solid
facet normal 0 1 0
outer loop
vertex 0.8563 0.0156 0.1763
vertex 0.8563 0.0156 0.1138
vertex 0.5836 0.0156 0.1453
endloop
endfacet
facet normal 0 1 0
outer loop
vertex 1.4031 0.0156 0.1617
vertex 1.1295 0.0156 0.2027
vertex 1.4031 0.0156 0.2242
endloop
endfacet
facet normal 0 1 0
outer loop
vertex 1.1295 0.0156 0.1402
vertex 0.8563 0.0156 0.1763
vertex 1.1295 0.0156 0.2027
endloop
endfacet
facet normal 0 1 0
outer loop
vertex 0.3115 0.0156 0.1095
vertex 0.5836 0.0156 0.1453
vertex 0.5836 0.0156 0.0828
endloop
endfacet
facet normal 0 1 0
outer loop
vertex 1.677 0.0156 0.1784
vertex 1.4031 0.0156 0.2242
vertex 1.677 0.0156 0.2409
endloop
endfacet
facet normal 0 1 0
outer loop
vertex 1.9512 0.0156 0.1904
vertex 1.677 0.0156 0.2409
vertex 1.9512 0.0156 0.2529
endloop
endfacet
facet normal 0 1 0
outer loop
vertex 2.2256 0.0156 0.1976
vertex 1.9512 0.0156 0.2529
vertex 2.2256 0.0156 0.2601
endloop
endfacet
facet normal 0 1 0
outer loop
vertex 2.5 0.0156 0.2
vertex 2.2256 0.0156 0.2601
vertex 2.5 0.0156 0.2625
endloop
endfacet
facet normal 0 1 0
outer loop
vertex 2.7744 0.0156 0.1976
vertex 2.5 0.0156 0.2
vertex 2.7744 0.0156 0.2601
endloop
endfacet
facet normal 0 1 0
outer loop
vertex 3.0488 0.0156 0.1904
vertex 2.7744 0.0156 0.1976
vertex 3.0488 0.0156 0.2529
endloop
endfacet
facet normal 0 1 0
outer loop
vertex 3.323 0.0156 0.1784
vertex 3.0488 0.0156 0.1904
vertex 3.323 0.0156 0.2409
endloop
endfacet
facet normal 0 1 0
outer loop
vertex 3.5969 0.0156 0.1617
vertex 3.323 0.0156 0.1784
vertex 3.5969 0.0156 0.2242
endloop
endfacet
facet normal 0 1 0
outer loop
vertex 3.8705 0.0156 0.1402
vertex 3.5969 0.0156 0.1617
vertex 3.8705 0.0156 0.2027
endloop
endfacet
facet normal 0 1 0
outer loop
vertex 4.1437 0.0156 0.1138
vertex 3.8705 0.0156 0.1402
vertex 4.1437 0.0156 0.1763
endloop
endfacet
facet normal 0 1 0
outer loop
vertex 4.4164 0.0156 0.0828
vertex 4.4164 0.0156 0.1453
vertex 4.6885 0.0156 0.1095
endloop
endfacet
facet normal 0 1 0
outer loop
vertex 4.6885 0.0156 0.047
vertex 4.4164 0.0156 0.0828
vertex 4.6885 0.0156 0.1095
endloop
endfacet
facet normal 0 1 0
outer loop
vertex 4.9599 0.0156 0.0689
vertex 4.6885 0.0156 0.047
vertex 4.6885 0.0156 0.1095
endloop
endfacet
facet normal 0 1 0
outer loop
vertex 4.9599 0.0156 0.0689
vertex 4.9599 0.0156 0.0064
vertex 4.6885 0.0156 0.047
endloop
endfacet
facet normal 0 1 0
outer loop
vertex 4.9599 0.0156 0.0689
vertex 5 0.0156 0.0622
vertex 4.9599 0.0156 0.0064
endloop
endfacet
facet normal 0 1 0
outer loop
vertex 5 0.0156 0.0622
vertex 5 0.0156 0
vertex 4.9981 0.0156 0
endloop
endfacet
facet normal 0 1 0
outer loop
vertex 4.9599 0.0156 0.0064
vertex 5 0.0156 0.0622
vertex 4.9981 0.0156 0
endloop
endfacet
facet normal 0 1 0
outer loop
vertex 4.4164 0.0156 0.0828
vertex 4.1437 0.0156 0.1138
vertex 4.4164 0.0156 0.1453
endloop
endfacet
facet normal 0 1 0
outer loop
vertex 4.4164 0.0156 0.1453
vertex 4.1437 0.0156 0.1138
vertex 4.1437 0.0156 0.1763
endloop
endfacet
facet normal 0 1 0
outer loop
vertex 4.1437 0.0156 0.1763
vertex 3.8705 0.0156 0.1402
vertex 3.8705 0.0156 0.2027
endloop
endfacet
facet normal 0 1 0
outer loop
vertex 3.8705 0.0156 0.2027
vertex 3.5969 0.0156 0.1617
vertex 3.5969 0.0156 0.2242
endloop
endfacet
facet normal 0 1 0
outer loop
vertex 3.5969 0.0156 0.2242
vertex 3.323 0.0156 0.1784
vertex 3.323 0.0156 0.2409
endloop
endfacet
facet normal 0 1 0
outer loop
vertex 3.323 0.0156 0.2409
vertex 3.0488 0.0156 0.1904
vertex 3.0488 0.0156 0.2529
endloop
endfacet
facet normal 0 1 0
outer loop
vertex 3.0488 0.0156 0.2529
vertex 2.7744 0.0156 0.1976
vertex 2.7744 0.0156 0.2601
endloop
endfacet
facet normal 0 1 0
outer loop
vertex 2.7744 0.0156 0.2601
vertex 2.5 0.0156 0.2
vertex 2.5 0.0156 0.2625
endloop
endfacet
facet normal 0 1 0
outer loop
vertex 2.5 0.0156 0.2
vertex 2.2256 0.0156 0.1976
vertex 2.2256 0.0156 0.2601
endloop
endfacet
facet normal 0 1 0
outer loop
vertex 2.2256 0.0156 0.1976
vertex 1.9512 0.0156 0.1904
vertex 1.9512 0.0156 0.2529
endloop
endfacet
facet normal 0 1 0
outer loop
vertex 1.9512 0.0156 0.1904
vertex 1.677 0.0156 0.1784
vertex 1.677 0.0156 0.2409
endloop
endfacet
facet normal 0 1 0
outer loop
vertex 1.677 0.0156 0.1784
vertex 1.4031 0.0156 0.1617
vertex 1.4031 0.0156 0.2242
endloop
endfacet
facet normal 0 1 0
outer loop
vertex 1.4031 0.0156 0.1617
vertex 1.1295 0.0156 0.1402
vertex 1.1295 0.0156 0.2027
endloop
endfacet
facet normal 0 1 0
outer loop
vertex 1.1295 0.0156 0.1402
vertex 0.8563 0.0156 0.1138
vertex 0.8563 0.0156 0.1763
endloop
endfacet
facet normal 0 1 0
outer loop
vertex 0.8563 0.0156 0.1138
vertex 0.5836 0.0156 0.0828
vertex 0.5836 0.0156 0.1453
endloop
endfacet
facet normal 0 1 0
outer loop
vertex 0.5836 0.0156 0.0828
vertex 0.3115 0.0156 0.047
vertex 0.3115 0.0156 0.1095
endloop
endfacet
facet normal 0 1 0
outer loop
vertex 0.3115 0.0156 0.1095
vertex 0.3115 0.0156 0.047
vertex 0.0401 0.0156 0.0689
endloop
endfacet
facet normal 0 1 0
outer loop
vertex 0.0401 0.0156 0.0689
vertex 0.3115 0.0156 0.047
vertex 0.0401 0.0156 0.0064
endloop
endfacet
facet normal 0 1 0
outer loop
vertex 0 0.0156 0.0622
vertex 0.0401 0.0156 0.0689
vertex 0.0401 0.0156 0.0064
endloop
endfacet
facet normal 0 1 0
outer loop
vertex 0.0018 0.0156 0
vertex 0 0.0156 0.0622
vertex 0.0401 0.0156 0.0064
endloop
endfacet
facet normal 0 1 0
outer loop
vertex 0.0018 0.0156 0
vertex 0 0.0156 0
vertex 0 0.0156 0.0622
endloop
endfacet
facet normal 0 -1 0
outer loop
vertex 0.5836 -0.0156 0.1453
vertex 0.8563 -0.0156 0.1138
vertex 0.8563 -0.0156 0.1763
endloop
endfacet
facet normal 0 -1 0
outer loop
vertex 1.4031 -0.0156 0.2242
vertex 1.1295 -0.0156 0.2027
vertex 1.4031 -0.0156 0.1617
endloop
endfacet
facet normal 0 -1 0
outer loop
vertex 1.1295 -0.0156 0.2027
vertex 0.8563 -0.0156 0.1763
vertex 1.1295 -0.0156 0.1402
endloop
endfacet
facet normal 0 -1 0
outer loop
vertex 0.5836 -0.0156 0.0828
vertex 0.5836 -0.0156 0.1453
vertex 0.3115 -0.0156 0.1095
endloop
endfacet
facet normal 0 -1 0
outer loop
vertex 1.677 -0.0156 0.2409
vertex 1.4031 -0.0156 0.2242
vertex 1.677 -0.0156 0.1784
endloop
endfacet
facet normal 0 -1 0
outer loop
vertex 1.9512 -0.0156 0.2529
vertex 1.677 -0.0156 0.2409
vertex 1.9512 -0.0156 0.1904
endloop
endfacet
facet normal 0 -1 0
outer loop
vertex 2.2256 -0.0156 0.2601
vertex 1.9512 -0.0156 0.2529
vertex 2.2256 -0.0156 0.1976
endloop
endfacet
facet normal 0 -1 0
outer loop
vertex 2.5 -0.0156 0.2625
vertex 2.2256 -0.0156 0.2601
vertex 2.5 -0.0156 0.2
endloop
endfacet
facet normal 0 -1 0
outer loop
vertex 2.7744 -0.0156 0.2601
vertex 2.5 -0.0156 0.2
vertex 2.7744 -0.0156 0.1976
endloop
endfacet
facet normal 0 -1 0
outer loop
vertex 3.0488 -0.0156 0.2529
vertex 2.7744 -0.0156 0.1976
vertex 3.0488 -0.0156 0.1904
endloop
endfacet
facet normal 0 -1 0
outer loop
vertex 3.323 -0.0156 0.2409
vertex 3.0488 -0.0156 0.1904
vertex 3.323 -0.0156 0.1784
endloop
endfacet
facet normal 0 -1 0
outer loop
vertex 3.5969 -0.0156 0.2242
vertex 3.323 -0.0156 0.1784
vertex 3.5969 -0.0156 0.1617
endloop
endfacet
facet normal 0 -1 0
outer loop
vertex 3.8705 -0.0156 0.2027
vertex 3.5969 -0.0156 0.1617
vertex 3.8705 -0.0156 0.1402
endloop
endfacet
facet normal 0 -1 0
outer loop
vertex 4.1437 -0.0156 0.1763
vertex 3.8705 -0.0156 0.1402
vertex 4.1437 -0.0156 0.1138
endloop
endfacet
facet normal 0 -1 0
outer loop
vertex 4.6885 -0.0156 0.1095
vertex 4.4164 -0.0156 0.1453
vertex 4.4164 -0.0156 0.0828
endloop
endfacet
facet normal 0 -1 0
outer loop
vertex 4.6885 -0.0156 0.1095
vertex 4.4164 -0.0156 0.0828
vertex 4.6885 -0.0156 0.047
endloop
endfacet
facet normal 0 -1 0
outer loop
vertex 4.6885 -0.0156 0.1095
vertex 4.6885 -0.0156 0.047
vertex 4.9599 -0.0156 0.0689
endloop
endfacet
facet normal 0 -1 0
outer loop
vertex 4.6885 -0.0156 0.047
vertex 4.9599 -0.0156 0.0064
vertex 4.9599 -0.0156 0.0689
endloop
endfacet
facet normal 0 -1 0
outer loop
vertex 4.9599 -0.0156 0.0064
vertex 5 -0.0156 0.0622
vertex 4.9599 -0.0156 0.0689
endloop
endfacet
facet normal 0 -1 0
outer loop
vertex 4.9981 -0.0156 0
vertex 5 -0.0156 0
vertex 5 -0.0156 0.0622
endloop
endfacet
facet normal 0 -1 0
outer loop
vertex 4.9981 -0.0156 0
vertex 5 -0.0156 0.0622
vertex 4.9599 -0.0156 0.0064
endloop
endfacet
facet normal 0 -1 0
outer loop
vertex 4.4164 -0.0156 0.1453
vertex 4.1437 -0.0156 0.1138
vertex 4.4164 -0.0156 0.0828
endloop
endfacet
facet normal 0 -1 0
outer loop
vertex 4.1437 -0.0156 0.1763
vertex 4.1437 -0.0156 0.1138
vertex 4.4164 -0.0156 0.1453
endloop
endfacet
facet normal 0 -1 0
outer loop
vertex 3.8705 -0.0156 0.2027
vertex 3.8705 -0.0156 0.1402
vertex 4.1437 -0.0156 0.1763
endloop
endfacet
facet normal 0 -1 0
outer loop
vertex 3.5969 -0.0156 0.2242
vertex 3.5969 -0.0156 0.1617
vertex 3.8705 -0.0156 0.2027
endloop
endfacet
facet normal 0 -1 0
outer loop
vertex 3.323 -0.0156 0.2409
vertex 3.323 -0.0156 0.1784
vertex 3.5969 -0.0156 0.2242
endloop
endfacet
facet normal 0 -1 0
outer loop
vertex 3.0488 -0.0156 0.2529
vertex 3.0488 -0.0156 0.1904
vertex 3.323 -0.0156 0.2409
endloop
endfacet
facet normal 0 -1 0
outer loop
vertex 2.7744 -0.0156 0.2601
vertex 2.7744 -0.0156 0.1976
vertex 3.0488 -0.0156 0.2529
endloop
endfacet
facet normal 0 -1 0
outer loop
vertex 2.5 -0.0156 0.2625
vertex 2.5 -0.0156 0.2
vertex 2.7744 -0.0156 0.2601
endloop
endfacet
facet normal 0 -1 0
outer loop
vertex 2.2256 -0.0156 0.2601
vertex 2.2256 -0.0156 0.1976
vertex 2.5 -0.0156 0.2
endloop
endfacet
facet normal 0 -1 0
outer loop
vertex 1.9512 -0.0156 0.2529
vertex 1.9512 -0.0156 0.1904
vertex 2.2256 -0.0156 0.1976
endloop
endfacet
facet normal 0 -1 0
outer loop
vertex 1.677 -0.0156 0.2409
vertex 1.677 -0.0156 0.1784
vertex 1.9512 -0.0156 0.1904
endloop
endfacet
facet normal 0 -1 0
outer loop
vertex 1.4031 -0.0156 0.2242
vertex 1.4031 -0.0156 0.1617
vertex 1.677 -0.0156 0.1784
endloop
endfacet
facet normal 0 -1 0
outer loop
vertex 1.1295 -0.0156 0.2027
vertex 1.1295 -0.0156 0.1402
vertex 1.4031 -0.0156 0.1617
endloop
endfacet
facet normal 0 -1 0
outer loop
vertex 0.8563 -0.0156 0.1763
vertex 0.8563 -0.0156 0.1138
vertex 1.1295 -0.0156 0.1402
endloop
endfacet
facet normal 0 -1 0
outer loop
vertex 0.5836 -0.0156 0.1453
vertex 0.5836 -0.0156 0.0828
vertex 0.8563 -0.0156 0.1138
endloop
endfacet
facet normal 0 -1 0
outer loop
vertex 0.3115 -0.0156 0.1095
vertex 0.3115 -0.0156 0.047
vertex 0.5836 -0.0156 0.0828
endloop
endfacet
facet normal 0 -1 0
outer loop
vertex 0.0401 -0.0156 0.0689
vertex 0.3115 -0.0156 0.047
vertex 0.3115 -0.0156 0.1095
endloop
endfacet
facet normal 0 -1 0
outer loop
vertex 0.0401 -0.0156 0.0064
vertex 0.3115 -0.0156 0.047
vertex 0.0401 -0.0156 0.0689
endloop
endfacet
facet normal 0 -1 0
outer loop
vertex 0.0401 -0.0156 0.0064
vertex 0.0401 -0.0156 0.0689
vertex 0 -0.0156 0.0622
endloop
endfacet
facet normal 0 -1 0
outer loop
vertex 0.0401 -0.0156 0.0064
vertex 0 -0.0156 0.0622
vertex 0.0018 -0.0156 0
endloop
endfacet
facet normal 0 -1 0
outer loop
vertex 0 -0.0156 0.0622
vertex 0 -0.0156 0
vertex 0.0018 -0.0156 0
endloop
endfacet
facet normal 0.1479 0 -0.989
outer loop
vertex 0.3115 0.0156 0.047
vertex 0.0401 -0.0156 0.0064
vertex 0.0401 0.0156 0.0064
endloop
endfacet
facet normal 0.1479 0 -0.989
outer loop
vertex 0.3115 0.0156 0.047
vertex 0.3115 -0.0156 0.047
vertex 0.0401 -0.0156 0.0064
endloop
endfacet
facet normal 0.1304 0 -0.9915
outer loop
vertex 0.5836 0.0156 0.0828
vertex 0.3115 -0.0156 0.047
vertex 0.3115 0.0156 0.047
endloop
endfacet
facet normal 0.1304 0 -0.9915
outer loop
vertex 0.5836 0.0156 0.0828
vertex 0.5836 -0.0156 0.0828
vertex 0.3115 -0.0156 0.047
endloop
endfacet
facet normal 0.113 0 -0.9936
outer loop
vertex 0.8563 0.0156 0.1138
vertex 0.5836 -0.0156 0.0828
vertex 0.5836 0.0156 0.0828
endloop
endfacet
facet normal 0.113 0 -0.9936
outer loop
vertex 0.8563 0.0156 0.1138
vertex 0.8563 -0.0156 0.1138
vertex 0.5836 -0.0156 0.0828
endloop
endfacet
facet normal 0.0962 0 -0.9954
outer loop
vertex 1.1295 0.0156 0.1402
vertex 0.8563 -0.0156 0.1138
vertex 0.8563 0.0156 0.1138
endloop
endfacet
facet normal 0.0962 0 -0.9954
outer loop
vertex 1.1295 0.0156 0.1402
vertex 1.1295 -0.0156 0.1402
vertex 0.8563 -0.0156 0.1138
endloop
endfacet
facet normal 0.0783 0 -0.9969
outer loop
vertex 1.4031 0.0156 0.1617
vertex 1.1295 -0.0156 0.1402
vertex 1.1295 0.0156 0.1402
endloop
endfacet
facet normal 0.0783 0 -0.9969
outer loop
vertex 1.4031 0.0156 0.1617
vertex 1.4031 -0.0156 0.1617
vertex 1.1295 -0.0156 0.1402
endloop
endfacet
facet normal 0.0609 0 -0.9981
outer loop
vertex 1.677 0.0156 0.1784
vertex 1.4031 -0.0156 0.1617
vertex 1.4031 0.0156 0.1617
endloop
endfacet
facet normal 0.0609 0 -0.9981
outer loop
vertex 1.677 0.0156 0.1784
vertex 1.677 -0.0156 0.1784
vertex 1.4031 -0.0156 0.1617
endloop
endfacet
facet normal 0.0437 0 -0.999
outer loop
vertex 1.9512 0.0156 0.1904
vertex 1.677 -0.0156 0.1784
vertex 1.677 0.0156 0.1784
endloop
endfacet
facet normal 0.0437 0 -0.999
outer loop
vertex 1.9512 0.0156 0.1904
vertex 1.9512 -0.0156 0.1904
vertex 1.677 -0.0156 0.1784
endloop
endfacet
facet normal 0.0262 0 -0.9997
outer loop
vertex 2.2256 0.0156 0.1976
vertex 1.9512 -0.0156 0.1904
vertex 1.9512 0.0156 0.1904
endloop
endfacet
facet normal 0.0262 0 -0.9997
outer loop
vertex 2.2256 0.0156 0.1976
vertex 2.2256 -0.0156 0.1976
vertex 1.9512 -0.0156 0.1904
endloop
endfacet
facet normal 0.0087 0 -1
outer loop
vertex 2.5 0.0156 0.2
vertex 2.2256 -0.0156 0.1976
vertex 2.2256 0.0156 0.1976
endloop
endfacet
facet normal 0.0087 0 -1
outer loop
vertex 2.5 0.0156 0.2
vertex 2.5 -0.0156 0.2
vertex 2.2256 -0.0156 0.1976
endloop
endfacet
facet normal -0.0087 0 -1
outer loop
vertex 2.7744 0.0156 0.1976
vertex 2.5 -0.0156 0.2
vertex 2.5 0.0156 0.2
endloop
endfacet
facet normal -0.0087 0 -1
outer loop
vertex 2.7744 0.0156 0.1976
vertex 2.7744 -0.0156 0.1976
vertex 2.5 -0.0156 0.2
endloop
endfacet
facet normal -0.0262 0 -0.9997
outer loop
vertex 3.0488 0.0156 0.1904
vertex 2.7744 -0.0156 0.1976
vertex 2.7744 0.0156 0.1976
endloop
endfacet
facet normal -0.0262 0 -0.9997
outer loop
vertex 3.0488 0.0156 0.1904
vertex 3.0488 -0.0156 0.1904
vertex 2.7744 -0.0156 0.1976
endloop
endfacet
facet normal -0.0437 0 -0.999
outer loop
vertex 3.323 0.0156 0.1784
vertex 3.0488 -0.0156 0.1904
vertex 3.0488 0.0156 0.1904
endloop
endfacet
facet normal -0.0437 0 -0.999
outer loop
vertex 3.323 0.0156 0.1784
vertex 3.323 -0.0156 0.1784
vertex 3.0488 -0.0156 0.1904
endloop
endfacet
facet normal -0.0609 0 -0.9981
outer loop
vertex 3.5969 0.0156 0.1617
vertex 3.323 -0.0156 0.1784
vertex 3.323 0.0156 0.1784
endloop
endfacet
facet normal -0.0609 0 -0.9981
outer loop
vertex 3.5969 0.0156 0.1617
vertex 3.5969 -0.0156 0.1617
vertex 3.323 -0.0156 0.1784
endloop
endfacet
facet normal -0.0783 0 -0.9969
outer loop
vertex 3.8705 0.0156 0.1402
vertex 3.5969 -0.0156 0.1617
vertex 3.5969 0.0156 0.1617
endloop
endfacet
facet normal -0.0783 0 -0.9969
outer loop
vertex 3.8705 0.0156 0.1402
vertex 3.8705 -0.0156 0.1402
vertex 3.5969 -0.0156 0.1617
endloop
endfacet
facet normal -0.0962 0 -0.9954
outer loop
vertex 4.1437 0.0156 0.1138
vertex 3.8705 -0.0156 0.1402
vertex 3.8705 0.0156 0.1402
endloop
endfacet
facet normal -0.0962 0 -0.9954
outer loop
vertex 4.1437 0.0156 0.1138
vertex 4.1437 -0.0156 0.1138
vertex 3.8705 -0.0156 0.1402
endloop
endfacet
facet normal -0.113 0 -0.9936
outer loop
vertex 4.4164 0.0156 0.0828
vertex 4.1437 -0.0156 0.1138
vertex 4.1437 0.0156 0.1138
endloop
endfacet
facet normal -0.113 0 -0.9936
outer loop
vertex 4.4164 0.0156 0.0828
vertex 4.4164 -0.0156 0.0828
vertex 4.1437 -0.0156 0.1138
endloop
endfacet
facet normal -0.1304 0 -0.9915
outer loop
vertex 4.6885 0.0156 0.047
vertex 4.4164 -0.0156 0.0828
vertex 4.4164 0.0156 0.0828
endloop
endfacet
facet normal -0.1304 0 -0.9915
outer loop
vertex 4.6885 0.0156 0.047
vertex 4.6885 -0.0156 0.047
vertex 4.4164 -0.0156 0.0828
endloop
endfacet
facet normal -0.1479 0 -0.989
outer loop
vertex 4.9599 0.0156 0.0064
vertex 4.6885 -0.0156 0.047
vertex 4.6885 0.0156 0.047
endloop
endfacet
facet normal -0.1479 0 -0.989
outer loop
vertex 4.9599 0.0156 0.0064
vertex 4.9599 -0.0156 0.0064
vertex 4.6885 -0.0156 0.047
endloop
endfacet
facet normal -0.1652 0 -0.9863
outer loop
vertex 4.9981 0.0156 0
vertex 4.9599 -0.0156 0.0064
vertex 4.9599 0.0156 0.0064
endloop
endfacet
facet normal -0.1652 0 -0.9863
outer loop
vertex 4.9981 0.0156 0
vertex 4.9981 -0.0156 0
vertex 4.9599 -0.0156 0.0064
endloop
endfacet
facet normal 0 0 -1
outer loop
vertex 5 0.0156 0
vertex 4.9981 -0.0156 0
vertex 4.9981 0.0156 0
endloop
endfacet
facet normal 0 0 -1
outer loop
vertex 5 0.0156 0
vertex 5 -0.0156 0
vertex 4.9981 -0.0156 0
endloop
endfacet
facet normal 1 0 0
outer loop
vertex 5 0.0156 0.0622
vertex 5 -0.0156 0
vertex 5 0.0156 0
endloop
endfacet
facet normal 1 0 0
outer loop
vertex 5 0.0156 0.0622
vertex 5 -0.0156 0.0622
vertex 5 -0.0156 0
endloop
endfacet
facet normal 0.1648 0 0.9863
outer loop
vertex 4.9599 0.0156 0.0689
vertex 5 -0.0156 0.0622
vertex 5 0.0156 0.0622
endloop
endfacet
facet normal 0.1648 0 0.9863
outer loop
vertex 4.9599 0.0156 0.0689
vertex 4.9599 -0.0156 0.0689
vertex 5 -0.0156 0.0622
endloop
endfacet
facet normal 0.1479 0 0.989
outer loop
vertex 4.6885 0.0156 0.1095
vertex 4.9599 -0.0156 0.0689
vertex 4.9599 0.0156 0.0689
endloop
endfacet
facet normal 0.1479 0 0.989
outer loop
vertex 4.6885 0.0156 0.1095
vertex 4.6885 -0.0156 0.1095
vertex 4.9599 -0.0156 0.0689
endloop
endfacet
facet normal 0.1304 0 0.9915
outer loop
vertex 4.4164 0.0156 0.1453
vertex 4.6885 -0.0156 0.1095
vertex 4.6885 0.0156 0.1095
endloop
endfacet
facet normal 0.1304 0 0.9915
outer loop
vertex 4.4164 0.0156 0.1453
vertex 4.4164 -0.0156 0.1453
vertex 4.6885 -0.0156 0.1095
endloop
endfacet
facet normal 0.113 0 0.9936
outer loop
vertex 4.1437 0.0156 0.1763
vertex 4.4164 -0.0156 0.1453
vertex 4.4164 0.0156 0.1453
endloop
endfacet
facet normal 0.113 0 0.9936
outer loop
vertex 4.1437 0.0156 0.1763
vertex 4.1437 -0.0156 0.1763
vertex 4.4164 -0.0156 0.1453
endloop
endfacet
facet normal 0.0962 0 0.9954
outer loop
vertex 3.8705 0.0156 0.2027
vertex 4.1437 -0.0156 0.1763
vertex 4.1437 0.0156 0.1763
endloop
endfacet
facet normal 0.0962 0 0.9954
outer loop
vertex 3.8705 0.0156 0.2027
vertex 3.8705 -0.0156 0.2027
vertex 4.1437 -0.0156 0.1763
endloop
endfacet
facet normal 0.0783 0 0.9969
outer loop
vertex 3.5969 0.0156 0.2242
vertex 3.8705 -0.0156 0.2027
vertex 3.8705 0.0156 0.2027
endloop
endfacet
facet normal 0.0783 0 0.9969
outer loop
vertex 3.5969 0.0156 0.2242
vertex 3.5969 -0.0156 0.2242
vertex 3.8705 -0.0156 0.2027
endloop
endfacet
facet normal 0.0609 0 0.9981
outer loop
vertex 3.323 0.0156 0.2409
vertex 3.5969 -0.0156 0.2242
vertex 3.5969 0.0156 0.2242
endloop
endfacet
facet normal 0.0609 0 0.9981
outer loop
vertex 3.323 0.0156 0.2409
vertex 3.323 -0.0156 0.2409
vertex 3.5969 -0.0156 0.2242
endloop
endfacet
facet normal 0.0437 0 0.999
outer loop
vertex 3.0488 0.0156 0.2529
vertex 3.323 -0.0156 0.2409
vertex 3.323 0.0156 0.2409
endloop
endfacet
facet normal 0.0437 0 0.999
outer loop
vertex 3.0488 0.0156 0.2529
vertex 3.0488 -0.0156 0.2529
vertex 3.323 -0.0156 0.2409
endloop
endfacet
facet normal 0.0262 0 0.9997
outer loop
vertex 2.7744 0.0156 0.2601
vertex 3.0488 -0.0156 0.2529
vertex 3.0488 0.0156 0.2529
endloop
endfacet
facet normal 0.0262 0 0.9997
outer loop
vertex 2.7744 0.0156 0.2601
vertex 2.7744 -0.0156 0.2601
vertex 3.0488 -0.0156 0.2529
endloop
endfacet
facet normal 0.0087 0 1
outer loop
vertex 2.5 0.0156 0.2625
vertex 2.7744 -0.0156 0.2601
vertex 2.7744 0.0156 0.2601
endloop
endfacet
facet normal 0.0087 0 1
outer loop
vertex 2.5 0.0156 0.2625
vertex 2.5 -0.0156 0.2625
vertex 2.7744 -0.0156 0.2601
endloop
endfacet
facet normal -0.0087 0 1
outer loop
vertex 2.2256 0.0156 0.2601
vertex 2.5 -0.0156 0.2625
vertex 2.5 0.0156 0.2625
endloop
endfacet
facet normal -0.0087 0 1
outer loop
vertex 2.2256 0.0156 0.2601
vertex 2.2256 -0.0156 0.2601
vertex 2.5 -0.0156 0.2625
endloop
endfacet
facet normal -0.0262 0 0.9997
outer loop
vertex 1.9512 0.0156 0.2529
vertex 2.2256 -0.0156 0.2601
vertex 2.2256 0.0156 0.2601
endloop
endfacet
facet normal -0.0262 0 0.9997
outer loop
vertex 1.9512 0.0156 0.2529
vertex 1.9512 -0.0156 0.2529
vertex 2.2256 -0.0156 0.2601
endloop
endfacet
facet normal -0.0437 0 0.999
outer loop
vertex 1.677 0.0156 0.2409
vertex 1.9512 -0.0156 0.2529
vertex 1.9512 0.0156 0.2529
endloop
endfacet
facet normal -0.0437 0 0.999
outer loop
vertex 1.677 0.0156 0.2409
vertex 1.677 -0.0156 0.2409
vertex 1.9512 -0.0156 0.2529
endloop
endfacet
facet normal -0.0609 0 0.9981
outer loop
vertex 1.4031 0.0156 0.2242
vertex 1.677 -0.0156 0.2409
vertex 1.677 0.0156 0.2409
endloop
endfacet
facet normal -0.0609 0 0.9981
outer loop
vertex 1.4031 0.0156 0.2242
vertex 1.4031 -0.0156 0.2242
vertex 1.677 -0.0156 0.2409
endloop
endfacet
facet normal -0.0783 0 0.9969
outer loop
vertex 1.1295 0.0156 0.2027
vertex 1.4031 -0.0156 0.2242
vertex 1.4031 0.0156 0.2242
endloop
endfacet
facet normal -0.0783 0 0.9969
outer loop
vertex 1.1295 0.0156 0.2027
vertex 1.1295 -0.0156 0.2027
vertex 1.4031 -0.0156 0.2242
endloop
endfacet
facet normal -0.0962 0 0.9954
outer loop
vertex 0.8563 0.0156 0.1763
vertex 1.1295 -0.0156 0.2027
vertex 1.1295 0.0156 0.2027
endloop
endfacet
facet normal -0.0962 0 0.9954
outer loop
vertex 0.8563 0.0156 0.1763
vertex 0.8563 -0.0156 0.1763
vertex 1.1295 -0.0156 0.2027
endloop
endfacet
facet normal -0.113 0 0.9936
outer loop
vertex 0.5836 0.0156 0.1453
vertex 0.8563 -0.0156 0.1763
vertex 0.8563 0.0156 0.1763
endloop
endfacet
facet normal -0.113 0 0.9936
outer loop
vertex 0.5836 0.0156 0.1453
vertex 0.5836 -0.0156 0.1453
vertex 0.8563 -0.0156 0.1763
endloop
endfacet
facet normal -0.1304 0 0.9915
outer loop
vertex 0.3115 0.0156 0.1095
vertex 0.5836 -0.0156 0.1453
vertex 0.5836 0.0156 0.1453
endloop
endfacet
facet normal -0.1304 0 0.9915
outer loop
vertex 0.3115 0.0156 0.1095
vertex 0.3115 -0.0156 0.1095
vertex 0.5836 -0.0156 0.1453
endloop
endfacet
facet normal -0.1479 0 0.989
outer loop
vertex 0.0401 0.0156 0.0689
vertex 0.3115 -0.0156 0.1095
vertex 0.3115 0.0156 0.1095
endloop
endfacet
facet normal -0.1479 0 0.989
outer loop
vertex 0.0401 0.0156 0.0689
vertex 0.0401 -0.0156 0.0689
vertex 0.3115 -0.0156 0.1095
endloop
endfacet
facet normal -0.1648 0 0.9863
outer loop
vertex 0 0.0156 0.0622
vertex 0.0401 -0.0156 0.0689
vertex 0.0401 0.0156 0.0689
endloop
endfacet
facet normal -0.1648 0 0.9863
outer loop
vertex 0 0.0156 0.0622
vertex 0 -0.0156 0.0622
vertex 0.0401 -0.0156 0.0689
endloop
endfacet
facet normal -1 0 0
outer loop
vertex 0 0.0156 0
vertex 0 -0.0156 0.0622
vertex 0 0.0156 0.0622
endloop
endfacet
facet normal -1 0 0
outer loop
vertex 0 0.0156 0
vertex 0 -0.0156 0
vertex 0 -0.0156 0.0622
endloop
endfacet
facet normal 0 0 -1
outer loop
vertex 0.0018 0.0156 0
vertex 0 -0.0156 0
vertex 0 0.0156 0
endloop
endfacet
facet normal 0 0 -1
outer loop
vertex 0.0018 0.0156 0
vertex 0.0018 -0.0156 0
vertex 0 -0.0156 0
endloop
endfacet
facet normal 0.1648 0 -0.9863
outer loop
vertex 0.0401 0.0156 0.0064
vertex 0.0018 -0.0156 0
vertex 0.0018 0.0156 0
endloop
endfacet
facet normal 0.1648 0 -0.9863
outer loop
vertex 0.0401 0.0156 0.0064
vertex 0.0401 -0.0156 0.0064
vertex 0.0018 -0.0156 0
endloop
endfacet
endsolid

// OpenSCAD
//####################################
// rib.scad - circle template rib
// (c) 2021 by Roie R. Black
//====================================
$fn=360;
module circle_template_rib(chord,camber,height,thickness) {

  // calculate the radius for this arc
  camber = chord * camber / 100;
  radius = (chord * chord) / (8 * camber) + camber/2;
  // generate the rib
  translate([0,thickness/2,0])
    rotate([90,0,0])
      linear_extrude(height = thickness) {
        intersection() {
          difference() {
            square([chord,1]);
            translate([chord/2, -radius + camber]) circle(r=radius);
          }
          translate([chord/2, -radius + camber + height]) circle(r=radius);
        }
      }
}
//====================================
// display this shape

circle_template_rib(5,4,1/16,1/32);
